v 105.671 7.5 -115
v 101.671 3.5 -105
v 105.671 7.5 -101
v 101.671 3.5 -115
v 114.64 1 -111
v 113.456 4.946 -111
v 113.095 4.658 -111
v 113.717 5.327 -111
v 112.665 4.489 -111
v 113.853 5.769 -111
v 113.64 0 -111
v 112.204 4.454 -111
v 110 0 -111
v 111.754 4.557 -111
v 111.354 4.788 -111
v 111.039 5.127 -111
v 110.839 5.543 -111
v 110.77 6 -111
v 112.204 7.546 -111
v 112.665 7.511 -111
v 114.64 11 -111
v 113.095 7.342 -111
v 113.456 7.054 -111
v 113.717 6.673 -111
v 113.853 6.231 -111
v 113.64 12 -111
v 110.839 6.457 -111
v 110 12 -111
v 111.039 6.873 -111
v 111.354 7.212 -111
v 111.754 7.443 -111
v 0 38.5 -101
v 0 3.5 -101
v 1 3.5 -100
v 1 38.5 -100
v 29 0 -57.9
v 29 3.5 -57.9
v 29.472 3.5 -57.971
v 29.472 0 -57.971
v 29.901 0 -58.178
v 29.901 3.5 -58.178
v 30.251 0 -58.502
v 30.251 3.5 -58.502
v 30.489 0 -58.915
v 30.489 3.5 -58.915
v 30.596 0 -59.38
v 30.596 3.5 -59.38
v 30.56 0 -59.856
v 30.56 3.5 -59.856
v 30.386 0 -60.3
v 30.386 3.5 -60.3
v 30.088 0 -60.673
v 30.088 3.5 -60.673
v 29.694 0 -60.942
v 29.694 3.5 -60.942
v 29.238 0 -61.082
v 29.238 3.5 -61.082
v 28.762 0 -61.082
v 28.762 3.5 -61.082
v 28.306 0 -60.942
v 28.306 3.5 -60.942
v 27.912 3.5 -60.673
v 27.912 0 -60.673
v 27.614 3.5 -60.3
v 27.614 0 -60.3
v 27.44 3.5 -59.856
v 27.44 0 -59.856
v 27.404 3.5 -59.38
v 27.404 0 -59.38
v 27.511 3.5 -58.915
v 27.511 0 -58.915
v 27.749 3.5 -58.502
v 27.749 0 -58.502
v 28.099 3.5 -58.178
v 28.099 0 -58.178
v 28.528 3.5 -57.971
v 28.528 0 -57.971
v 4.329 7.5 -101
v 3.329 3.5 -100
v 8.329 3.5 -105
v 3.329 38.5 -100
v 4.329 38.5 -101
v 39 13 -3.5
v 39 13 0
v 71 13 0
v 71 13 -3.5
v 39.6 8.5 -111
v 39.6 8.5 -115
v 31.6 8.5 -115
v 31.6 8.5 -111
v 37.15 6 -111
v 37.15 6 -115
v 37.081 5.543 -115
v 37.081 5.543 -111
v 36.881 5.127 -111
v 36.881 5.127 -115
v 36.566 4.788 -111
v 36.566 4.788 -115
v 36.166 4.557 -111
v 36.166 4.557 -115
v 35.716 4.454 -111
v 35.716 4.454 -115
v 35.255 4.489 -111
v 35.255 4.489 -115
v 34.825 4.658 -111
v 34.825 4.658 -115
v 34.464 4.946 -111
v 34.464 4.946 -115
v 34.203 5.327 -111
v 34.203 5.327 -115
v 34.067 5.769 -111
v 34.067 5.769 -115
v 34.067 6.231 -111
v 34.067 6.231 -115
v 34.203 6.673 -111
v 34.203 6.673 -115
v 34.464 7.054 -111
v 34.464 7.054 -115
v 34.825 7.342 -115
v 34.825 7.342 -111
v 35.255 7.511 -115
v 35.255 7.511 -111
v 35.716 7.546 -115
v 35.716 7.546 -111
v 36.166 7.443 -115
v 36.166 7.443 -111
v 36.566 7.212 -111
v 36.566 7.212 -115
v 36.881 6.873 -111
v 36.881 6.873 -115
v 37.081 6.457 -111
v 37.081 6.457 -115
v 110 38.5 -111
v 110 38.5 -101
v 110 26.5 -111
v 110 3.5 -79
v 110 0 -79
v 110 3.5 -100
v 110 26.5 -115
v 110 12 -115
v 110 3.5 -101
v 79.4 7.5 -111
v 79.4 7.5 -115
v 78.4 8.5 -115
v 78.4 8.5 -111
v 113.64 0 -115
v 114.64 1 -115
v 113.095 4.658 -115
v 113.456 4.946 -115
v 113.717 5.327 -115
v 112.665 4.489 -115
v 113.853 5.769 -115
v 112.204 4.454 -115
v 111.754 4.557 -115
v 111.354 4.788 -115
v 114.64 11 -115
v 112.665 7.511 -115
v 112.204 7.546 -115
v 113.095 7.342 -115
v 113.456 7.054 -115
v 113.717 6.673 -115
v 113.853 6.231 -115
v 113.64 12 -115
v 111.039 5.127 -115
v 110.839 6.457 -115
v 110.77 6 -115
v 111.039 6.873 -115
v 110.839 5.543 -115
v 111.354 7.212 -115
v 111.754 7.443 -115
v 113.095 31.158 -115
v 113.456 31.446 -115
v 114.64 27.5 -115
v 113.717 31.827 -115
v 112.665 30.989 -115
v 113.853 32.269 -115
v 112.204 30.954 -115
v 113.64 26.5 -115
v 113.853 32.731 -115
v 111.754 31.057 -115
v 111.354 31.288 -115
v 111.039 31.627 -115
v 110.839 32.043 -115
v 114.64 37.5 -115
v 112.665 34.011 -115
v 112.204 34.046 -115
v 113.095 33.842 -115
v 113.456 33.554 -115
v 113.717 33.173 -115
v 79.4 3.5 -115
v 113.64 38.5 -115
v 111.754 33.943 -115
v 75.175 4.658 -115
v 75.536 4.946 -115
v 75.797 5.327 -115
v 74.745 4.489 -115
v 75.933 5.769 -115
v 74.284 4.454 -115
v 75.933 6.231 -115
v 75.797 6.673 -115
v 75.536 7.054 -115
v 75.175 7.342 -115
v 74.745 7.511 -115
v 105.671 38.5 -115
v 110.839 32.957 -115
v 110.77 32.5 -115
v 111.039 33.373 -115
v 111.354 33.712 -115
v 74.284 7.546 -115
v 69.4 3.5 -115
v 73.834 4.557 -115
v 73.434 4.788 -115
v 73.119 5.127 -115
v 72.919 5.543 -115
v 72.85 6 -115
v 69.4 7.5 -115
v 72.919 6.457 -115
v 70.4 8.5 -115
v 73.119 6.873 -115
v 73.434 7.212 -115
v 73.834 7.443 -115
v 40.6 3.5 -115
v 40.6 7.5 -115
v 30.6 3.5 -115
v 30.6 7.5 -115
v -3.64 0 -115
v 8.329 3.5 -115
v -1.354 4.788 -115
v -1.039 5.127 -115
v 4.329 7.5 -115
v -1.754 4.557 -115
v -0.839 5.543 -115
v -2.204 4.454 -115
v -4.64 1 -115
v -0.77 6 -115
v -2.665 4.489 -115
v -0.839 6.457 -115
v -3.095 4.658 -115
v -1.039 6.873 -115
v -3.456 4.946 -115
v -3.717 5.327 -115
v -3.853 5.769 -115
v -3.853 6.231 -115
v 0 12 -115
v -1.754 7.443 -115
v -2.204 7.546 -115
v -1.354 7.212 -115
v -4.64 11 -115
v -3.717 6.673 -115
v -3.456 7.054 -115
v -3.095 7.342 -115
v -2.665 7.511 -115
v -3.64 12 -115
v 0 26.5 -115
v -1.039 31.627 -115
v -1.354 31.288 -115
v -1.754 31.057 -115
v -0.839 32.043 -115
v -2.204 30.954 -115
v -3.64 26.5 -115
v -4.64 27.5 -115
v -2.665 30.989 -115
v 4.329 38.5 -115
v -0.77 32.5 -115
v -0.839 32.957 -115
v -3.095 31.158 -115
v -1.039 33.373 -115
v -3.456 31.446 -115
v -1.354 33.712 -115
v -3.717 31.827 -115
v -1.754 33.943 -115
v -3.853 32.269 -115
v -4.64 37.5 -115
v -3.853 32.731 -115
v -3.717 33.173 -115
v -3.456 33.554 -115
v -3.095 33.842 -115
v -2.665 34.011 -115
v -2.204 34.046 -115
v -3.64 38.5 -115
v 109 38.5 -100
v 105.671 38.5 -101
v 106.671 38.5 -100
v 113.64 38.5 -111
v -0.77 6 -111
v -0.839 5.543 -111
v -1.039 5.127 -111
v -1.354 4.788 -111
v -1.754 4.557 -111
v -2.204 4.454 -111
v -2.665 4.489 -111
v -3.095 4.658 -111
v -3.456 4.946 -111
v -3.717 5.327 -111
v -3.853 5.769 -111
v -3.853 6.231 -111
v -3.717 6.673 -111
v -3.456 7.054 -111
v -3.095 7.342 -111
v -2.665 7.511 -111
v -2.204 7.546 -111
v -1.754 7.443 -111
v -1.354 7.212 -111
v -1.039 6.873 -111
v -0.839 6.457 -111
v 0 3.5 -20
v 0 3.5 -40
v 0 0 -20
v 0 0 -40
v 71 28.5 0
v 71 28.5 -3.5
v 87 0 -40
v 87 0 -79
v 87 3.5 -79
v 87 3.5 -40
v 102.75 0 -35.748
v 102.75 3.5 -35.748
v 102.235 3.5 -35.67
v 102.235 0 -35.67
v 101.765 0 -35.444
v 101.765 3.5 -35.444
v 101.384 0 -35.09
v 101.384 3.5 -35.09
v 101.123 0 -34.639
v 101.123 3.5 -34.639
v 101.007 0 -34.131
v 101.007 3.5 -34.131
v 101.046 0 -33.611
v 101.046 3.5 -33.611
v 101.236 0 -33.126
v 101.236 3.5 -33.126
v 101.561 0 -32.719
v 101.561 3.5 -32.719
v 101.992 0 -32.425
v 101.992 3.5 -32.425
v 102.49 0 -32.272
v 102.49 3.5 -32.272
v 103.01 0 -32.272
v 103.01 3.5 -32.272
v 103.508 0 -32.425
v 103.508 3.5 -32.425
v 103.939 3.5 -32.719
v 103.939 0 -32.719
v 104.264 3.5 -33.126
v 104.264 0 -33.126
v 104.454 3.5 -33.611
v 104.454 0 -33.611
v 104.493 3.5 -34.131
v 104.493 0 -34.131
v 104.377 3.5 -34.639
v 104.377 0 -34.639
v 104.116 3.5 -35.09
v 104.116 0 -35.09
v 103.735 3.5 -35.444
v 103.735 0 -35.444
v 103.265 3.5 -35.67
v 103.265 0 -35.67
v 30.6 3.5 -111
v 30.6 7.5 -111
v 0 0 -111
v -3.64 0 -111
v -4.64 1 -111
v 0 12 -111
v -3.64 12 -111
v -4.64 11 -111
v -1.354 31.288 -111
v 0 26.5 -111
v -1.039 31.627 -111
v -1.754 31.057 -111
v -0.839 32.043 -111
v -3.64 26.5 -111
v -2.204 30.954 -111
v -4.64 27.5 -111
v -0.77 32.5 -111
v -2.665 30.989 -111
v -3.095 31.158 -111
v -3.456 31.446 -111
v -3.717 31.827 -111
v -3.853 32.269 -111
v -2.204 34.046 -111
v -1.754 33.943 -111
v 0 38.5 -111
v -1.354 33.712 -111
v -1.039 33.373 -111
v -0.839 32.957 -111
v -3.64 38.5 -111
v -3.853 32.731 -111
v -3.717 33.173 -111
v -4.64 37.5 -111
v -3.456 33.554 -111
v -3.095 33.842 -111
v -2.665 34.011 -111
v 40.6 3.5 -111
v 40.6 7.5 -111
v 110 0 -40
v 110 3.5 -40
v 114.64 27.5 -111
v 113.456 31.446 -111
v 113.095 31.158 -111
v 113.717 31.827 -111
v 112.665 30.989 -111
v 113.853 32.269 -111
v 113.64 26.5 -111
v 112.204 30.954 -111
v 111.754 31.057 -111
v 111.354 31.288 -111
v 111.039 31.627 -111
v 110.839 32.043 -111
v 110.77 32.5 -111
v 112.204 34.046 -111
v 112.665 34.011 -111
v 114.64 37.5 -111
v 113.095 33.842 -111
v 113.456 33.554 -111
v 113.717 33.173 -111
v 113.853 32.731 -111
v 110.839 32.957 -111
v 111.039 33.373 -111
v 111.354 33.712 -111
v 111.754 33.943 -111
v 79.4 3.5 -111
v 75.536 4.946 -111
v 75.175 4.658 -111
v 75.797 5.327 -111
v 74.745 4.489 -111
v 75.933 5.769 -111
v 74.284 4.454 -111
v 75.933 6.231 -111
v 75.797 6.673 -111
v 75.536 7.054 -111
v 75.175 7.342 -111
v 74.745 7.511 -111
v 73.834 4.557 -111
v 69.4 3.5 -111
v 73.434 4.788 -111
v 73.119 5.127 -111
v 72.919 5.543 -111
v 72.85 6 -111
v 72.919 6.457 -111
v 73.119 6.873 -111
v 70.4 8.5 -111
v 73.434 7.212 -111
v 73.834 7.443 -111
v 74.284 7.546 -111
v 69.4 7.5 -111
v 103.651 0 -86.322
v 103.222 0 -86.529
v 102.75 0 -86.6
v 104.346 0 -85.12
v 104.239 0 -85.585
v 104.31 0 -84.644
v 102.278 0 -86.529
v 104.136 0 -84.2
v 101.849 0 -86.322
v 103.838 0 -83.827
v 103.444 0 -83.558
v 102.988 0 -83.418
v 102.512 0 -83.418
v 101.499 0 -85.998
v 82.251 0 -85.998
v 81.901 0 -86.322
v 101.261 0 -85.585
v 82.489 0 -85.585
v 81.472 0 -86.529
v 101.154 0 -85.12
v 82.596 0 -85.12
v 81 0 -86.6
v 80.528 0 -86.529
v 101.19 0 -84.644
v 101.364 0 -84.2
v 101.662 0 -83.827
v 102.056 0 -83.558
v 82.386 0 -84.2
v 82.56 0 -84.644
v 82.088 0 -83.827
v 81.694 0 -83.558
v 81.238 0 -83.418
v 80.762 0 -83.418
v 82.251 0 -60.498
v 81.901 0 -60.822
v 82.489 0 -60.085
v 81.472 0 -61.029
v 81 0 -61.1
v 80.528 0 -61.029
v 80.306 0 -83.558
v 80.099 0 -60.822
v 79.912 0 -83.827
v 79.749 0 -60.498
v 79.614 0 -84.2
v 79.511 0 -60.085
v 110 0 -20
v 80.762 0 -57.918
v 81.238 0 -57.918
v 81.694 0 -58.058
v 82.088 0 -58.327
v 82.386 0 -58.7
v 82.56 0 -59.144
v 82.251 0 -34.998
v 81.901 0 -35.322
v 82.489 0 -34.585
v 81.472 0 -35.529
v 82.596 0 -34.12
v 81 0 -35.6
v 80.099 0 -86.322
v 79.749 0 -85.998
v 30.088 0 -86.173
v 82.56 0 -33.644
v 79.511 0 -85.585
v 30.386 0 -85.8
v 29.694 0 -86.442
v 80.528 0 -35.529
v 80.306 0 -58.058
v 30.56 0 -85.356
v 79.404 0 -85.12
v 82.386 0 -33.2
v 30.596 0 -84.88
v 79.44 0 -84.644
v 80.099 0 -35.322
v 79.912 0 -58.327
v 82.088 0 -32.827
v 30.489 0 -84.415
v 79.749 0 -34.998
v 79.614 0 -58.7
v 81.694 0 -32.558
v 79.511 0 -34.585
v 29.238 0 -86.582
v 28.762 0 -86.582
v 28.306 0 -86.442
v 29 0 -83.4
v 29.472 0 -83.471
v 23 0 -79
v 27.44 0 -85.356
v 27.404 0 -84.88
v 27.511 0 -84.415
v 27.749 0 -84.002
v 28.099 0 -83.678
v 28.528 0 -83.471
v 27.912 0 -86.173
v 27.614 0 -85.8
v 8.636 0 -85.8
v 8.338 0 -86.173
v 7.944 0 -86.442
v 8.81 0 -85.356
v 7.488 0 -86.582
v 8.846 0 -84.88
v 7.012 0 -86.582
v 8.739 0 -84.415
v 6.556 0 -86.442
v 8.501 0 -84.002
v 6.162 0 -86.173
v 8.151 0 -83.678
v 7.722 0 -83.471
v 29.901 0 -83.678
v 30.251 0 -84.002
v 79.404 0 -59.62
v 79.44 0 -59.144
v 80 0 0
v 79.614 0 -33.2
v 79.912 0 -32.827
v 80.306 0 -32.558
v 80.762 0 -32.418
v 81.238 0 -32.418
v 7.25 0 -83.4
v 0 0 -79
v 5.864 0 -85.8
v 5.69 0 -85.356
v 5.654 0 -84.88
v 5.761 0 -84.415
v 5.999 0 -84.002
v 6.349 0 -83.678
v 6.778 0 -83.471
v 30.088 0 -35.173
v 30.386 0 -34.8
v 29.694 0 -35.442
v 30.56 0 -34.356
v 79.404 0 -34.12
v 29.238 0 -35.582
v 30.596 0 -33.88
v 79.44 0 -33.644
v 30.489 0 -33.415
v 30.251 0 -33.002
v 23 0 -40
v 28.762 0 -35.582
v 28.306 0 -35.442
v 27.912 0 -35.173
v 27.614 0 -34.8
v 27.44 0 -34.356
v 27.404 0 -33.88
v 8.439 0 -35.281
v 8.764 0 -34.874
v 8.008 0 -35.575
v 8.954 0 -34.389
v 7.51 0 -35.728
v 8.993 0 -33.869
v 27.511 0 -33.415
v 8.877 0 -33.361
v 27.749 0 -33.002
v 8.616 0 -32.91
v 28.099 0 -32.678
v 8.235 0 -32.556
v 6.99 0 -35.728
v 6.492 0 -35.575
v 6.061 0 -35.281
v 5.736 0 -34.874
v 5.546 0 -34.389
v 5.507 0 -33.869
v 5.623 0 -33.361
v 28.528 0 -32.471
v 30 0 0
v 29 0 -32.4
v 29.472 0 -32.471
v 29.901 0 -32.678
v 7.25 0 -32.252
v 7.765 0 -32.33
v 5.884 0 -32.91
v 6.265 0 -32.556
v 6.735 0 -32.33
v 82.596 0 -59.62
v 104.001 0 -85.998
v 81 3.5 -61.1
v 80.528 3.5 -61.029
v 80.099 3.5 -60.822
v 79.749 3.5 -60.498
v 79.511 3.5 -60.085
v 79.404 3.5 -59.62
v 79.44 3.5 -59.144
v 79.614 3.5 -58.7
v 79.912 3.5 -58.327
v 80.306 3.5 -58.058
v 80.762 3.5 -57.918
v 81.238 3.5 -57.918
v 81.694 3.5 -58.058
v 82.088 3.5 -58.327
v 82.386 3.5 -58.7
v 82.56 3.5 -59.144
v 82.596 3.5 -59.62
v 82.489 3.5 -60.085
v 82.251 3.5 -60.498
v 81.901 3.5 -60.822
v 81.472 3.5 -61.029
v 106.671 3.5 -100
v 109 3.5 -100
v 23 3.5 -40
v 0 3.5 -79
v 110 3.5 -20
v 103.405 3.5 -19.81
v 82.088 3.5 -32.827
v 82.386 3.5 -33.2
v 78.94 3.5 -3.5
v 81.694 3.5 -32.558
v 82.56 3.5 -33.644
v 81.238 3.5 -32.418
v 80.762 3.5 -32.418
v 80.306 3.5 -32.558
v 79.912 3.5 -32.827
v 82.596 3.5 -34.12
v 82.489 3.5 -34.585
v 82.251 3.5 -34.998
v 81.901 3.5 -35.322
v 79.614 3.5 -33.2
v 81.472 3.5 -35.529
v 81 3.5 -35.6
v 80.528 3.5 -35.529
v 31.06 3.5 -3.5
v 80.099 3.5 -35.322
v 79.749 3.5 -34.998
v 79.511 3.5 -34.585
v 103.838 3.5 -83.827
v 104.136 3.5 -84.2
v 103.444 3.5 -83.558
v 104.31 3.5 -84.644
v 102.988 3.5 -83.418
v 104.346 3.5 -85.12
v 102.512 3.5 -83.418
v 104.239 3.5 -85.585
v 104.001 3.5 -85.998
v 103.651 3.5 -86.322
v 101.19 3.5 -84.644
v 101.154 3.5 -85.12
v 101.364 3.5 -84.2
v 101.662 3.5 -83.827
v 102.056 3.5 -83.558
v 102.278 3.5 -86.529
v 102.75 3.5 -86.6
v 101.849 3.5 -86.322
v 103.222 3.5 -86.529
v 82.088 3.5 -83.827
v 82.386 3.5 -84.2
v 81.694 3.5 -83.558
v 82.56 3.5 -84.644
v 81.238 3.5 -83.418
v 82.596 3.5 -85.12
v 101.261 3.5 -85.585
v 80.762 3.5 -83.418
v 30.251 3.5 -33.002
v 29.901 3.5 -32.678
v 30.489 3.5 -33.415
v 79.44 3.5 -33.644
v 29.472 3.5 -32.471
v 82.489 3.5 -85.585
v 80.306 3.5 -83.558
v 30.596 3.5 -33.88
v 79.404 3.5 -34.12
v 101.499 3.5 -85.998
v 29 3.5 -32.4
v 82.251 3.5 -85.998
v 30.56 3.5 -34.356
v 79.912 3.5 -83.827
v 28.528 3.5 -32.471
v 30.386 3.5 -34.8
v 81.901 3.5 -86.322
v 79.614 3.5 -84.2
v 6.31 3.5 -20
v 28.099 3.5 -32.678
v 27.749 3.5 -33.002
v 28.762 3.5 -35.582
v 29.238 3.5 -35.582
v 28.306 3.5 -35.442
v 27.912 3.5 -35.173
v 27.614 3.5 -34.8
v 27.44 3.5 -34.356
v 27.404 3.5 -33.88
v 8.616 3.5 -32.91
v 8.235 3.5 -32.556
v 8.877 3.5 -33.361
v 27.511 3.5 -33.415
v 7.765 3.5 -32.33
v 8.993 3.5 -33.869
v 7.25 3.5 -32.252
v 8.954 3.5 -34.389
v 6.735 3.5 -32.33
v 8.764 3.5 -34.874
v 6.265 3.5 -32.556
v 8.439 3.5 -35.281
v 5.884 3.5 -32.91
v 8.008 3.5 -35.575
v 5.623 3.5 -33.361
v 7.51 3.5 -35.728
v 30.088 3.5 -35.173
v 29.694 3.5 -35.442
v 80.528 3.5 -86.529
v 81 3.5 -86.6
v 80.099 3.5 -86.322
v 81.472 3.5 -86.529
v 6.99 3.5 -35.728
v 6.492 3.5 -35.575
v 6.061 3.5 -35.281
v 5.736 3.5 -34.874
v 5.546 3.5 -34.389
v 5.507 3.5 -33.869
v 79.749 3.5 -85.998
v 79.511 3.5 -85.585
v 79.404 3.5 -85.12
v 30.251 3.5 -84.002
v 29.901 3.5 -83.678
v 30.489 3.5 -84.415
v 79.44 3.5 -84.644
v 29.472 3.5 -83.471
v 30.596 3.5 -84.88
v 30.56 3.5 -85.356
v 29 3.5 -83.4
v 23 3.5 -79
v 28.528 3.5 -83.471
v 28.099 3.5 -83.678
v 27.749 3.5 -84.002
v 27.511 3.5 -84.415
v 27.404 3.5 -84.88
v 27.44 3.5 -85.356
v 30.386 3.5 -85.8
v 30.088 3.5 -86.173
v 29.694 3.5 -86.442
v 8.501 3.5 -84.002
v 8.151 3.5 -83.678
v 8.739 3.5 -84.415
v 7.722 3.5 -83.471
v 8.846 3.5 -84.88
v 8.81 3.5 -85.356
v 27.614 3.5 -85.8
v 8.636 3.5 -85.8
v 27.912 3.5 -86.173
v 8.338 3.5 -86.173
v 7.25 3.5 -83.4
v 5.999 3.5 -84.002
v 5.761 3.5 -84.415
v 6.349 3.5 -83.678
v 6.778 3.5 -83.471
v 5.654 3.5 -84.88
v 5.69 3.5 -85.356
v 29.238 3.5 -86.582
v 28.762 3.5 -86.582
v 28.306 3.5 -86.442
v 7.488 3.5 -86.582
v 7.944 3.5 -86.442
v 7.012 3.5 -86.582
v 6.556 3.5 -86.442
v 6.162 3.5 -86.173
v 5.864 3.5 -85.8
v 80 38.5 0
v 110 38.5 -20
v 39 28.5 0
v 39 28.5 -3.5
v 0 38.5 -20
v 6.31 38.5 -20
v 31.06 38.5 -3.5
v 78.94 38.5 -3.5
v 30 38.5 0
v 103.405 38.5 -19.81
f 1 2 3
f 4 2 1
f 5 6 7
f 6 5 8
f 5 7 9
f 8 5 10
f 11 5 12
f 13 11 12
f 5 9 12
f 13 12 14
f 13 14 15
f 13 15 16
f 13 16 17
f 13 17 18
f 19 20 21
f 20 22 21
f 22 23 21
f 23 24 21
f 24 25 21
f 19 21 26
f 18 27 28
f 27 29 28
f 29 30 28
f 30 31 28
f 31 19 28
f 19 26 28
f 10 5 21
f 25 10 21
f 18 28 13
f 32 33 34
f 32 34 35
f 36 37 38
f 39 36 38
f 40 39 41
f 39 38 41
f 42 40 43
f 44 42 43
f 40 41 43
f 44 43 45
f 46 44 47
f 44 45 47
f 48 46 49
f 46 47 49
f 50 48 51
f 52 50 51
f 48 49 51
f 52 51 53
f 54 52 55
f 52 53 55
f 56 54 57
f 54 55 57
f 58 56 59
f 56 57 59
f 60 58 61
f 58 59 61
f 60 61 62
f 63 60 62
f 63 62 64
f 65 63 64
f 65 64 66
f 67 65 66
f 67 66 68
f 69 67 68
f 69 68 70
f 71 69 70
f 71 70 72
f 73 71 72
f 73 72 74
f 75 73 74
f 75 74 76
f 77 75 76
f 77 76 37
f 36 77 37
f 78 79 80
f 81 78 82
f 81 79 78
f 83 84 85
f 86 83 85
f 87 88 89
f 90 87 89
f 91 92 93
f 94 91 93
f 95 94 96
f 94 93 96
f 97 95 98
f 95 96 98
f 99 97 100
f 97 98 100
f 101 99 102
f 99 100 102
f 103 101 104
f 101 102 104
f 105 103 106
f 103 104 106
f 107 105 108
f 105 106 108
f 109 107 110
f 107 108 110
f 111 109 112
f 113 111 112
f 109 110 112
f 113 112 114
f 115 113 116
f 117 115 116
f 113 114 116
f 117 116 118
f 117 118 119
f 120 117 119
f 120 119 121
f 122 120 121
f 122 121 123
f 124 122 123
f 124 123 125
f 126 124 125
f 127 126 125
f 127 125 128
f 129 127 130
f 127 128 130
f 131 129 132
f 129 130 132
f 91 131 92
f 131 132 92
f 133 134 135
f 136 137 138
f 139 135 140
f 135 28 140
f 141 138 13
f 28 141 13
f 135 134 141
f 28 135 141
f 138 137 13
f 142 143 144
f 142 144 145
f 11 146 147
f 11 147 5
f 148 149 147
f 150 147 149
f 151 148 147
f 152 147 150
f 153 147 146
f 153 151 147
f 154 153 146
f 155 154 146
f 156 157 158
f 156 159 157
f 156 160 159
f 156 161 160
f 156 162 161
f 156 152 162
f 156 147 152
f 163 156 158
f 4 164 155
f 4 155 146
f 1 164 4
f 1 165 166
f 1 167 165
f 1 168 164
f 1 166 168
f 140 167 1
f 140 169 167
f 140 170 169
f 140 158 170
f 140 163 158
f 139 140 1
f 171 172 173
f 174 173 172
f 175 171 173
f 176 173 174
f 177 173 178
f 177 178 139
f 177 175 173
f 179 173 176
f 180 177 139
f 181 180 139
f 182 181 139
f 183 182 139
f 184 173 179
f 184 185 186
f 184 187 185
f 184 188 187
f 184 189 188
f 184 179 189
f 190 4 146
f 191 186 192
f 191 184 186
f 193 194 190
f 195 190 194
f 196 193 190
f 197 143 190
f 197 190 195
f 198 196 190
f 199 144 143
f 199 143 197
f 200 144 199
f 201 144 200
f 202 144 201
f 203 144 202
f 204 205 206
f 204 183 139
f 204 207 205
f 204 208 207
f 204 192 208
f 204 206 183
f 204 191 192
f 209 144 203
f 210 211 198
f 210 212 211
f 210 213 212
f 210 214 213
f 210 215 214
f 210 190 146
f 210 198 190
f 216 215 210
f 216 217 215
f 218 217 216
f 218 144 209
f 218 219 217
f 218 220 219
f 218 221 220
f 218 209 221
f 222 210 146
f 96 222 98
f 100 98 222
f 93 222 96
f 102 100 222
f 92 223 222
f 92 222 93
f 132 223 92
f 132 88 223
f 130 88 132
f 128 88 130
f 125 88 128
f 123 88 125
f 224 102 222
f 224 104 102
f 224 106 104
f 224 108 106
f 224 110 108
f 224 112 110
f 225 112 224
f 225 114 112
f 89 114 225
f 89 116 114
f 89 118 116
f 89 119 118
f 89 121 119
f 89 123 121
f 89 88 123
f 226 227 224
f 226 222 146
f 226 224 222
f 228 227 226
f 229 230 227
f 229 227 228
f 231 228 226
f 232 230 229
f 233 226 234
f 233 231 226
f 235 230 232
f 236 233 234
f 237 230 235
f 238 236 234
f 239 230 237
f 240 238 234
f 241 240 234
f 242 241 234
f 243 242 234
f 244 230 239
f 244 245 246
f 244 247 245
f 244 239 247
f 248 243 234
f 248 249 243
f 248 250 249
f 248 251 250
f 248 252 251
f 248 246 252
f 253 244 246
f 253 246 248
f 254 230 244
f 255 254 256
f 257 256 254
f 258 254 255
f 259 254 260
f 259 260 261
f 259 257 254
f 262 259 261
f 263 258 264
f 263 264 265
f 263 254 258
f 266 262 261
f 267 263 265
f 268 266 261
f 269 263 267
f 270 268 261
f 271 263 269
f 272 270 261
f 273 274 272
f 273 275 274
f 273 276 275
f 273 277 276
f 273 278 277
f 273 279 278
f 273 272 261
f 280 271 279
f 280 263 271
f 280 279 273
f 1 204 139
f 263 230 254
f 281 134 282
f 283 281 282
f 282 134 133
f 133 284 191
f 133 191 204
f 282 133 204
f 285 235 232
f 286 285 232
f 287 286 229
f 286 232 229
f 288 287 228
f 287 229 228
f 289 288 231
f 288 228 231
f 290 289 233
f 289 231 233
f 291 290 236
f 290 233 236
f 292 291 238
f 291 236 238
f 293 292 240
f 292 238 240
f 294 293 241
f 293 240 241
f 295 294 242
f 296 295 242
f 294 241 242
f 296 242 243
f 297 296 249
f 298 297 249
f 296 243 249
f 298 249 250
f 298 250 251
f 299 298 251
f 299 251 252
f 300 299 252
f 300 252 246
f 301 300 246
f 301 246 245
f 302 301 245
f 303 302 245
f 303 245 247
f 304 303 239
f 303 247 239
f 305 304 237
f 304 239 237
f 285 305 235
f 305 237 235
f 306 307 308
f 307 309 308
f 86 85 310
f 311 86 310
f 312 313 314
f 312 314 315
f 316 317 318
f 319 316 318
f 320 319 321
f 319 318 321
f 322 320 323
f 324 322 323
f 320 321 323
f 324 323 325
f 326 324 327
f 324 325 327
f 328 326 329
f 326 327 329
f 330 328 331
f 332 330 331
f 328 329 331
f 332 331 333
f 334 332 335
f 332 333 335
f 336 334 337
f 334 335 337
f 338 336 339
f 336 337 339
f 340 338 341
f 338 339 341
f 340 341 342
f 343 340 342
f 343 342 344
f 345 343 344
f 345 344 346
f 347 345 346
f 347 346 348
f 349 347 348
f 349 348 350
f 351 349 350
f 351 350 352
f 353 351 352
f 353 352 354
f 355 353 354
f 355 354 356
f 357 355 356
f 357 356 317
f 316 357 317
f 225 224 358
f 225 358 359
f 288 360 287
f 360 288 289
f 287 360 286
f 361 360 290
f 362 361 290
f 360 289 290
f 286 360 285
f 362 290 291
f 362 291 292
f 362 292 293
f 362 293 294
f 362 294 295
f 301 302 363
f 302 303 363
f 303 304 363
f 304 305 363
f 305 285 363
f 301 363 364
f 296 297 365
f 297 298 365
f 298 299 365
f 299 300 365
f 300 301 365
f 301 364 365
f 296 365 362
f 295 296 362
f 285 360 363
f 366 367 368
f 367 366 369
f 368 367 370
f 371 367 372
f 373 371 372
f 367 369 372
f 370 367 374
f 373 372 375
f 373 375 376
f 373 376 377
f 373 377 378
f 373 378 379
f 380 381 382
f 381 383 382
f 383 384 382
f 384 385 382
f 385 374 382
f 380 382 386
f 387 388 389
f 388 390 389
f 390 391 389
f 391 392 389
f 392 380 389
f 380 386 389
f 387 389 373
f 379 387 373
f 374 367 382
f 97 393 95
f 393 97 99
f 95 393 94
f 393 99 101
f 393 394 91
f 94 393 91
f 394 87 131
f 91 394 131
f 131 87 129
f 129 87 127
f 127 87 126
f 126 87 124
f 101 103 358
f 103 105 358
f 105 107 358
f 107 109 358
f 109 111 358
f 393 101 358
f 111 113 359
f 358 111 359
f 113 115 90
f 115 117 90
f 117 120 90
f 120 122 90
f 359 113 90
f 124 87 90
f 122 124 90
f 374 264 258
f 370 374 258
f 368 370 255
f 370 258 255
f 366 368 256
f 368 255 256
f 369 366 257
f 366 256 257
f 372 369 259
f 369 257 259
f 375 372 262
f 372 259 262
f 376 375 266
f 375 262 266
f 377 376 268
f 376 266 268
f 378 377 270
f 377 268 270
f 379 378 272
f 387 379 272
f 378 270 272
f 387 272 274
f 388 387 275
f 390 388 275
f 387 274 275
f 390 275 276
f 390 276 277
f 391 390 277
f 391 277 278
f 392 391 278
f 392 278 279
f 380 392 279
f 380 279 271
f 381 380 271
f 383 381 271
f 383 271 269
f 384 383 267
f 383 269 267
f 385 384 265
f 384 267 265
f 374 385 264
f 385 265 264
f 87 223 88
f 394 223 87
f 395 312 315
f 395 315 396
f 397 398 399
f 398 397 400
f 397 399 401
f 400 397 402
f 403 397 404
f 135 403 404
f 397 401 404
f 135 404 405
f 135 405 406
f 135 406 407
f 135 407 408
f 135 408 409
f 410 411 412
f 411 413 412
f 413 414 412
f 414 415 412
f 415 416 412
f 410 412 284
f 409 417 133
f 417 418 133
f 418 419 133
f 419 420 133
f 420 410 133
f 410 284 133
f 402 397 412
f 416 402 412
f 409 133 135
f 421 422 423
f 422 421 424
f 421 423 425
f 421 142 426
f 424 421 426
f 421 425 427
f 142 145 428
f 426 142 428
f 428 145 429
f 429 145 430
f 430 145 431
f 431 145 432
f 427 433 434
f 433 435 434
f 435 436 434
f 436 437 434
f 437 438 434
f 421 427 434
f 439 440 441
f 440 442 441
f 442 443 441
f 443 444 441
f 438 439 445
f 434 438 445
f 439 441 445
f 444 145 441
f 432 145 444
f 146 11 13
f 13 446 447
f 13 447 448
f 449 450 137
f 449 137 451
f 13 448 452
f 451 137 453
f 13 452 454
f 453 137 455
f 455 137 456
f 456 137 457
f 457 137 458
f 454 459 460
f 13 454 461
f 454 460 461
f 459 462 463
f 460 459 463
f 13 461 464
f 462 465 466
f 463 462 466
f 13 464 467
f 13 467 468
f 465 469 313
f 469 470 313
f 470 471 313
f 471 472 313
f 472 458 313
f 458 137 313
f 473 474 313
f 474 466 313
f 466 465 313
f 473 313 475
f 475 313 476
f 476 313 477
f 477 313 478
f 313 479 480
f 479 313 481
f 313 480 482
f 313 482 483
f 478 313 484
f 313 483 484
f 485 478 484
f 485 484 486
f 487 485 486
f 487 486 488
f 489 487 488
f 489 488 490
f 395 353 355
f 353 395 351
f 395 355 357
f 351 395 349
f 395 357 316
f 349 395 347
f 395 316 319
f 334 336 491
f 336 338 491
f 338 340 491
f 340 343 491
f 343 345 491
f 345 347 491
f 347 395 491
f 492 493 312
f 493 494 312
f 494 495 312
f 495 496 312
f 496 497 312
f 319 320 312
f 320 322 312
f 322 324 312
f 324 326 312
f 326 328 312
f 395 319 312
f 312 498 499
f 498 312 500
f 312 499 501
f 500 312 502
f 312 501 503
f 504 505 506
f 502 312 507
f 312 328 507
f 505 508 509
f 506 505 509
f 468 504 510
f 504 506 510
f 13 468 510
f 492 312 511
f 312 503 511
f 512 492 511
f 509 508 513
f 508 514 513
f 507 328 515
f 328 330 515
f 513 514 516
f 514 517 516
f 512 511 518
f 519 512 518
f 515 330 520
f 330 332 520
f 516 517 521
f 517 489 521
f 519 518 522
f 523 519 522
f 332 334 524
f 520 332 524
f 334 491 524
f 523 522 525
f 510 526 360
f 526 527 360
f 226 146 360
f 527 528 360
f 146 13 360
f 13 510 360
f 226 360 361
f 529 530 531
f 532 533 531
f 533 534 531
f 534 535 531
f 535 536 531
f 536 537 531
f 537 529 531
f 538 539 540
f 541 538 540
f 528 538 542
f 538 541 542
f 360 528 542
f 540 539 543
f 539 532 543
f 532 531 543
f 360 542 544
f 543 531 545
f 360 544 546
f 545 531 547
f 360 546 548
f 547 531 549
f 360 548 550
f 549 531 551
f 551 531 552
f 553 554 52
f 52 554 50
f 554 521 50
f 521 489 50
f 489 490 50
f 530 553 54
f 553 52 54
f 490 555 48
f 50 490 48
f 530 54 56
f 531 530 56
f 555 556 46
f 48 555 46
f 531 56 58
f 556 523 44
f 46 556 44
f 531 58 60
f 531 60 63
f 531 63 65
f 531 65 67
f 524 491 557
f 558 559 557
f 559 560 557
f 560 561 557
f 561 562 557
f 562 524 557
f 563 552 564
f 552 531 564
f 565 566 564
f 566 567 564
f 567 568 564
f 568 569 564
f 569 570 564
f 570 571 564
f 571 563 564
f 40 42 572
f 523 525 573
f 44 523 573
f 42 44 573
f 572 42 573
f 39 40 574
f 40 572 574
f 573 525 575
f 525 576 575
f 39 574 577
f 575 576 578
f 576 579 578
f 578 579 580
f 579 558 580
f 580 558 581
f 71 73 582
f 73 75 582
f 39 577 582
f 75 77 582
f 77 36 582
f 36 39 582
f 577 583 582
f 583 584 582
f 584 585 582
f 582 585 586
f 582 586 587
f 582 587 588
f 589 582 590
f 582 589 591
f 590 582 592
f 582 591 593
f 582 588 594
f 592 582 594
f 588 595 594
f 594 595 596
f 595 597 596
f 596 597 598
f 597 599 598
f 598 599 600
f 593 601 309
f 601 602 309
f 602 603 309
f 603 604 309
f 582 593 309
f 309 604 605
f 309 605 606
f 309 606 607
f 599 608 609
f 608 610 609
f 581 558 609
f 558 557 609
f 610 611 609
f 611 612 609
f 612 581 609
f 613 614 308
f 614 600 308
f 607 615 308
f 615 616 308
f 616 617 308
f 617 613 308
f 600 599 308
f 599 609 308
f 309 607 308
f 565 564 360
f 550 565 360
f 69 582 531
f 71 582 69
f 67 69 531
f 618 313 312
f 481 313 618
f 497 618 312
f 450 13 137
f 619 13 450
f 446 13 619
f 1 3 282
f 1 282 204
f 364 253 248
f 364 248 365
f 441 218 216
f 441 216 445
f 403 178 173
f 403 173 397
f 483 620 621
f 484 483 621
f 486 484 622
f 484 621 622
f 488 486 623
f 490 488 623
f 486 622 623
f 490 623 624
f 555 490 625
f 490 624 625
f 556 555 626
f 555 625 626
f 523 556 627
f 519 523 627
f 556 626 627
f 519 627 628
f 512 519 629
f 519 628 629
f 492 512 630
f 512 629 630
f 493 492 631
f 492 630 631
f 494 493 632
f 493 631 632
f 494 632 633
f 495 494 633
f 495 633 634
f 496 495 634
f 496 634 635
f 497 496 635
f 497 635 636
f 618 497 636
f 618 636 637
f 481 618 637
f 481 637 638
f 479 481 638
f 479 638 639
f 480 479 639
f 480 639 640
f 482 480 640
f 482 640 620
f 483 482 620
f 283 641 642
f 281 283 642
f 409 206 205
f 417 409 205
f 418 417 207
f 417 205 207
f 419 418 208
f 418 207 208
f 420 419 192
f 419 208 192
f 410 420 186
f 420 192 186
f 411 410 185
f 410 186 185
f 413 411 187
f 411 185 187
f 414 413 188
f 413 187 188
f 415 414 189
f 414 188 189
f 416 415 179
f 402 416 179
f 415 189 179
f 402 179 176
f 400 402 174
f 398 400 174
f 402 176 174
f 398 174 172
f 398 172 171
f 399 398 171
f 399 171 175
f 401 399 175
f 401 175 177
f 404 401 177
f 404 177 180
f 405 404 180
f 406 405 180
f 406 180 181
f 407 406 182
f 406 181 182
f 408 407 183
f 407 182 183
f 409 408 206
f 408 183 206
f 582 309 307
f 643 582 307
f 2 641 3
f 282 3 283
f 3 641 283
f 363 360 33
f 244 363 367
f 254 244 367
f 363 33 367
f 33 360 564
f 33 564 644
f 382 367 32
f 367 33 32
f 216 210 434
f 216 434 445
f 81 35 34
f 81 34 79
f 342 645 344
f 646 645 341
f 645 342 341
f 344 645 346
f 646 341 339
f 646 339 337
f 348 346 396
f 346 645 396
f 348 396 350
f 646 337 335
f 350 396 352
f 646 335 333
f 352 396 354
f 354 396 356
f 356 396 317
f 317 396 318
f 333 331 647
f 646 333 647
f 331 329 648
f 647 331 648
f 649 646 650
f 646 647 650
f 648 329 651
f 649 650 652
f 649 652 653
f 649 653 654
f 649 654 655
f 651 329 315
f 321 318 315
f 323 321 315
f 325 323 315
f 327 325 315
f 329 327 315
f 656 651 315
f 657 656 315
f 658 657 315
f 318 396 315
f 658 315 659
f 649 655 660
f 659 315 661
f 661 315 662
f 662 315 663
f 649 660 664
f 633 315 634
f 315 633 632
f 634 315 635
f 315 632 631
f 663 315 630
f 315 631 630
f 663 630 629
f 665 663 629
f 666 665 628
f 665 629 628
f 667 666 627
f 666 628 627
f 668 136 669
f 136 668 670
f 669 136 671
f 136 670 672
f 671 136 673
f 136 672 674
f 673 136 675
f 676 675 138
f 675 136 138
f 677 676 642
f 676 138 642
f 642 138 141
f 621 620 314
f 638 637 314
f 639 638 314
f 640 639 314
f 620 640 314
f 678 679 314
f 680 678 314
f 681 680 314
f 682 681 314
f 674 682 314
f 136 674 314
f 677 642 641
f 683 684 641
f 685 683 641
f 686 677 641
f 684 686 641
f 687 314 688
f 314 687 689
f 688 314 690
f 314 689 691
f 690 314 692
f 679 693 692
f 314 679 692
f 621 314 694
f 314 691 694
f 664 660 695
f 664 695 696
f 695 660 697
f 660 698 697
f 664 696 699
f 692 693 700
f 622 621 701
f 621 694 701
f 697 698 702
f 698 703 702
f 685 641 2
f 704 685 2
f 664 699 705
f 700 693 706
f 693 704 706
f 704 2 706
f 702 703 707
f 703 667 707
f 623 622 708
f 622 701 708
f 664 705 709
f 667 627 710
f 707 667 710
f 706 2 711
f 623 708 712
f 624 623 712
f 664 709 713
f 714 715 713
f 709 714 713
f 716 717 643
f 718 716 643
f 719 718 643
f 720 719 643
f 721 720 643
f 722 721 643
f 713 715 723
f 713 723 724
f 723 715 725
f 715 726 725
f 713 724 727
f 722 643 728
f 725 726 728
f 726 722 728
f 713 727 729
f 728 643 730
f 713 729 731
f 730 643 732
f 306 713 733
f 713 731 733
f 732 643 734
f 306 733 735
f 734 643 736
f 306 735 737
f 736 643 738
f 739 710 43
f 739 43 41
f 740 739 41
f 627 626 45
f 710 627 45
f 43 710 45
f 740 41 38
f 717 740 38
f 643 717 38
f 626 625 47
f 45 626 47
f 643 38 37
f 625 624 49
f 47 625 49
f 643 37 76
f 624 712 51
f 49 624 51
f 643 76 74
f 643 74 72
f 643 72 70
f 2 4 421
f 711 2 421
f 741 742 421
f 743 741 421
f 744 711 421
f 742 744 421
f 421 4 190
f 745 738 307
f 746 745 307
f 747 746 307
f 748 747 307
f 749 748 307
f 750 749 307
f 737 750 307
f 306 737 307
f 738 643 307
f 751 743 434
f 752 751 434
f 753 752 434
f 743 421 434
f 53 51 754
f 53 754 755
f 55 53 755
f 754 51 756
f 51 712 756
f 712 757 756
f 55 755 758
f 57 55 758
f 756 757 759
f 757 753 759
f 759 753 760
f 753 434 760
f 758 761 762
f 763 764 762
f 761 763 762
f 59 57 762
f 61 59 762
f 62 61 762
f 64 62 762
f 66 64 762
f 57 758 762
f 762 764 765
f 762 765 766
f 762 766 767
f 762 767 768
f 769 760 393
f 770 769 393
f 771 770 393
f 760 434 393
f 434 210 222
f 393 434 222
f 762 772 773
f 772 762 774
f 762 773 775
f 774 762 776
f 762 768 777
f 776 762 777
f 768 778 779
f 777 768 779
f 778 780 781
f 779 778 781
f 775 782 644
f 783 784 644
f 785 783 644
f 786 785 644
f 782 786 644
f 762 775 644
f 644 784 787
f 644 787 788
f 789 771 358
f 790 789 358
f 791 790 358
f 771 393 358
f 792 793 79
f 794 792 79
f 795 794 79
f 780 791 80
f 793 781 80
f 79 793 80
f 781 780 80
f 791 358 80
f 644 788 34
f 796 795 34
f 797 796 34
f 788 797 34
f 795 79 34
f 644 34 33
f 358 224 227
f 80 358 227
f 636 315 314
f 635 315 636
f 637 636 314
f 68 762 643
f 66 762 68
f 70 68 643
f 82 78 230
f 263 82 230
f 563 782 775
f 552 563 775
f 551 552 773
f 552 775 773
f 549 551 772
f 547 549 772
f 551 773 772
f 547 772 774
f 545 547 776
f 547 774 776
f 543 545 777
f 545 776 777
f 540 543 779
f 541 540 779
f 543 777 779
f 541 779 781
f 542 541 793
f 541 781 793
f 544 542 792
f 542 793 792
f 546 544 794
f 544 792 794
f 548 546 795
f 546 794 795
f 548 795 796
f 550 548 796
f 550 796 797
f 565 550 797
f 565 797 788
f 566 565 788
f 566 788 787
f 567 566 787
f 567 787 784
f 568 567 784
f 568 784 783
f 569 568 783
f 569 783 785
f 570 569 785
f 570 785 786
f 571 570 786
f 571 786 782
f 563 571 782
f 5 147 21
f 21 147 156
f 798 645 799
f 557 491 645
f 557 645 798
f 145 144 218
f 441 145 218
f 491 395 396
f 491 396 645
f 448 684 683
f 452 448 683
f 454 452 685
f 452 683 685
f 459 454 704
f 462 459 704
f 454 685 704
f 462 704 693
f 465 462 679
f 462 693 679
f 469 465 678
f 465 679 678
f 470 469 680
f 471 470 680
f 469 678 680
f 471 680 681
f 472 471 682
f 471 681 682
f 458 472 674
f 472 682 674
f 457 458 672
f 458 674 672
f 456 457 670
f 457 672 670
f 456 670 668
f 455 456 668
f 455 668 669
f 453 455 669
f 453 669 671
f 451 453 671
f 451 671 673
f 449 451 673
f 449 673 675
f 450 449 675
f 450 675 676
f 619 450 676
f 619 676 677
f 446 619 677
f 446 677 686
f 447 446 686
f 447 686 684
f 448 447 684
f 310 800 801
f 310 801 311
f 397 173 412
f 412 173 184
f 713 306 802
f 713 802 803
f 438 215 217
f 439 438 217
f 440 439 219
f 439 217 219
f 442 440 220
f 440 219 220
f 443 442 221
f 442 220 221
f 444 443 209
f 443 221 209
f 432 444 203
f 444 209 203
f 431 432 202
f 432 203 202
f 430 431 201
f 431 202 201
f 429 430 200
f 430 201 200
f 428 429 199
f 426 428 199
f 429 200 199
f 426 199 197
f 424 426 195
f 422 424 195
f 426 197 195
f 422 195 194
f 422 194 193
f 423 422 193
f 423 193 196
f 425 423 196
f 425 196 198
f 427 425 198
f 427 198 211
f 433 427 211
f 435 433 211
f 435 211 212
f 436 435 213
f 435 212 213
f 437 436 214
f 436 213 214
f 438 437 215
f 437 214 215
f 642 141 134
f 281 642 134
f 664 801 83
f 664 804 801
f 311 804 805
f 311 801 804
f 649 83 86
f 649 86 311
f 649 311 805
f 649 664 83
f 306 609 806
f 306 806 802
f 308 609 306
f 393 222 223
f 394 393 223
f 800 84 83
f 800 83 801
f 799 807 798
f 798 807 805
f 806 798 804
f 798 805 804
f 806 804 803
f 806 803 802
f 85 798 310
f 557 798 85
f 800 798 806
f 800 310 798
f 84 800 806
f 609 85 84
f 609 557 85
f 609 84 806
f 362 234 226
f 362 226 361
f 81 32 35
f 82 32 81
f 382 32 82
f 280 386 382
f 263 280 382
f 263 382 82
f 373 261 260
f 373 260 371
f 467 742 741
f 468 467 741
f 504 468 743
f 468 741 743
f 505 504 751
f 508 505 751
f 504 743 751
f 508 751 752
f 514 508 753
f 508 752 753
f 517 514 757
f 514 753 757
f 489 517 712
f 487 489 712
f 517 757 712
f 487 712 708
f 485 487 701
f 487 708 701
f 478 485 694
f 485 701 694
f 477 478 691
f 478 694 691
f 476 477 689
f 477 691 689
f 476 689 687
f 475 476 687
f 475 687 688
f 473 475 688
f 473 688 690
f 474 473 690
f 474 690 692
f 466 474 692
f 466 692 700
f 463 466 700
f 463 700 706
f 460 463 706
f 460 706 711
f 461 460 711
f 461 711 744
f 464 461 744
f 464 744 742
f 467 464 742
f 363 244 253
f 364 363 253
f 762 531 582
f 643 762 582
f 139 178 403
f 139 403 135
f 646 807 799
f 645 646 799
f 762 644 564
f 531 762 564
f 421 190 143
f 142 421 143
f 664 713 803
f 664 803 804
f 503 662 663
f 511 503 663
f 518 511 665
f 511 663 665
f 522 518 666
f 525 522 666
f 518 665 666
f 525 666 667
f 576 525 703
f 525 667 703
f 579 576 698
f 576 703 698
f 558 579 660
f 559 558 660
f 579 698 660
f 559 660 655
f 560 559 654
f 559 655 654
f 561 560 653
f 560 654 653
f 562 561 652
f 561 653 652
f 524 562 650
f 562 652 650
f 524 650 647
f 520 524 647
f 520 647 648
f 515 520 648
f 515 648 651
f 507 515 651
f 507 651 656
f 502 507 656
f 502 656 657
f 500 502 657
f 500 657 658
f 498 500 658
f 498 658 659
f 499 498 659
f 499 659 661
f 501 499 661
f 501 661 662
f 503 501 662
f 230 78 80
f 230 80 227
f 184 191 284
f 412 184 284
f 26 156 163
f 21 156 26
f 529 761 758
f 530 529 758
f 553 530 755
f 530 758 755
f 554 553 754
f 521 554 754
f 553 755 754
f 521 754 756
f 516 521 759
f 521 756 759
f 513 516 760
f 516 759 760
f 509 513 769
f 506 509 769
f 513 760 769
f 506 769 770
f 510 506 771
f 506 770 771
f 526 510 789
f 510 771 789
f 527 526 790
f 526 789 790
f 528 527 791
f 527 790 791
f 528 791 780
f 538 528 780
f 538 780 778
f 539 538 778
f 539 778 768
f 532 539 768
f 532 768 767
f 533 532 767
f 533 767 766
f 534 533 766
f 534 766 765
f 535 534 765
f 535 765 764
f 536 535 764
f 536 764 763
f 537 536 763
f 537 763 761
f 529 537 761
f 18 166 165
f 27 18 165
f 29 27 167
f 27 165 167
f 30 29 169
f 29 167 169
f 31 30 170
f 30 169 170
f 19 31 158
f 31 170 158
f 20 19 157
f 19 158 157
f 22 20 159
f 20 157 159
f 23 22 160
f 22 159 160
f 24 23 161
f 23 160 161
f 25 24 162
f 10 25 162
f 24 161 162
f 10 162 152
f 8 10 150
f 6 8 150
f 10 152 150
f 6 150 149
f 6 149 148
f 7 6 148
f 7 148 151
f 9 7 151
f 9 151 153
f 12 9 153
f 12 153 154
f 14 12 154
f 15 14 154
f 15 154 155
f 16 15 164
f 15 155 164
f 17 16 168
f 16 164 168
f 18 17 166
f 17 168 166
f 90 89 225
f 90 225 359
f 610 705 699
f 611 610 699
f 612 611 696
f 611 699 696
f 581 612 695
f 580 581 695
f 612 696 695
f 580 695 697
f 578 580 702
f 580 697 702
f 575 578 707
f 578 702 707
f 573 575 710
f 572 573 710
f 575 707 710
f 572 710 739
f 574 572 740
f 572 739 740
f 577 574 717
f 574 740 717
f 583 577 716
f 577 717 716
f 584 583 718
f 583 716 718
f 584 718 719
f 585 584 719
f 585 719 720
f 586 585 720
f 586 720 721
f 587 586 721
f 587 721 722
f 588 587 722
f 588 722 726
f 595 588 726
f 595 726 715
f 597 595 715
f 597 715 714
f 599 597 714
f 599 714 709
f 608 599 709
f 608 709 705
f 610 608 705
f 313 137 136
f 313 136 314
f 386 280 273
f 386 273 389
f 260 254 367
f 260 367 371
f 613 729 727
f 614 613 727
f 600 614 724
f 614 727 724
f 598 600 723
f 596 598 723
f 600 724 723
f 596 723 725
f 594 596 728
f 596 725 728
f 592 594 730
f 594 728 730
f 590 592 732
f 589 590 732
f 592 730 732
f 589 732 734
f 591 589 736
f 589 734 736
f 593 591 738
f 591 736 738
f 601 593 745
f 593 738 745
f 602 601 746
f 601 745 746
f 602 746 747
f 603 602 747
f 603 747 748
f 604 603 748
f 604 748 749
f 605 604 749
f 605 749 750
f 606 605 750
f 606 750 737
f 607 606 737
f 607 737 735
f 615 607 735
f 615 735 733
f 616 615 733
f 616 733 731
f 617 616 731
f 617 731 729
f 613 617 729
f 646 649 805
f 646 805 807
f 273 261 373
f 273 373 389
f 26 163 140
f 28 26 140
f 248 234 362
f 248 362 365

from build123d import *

# Parameters (mm, degrees)
BOSS_EXTRUDE1_DEPTH  = 3.5
BOSS_EXTRUDE2_DEPTH  = 21
SKETCH3_W            = 23
SKETCH3_H            = 39
BOSS_EXTRUDE3_DEPTH  = 2.5
SKETCH5_W            = 21.5
SKETCH5_H            = 25
SKETCH5_W_2          = 7.07
SKETCH5_H_2          = 19.04
BOSS_EXTRUDE5_DEPTH  = 2.5
SKETCH6_W            = 7.07
SKETCH6_H            = 5.9
BOSS_EXTRUDE6_DEPTH  = 20
BOSS_EXTRUDE7_DEPTH  = 23
FILLET1_SIZE         = 10
SKETCH9_R            = 2.475
BOSS_EXTRUDE8_DEPTH  = 9
FILLET2_R            = 0.5
SKETCH10_R           = 1.65
CUT_EXTRUDE1_DEPTH   = 9
SKETCH11_W           = 0.2
SKETCH11_H           = 20
CUT_EXTRUDE2_DEPTH   = 9
CUT_EXTRUDE3_DEPTH   = 9
FILLET3_SIZE         = 3
BOSS_EXTRUDE9_DEPTH  = 5
SKETCH14_R           = 1.747814763
SKETCH14_R_2         = 1.6
CUT_EXTRUDE4_DEPTH   = 15
BOSS_EXTRUDE10_DEPTH = 35
SKETCH17_W           = 110
SKETCH17_H           = 3.5
BOSS_EXTRUDE11_DEPTH = 15
SKETCH18_W           = 161.485932181
SKETCH18_H           = 44
CUT_EXTRUDE5_DEPTH   = 63
SKETCH19_W           = 4.328620931
SKETCH19_H           = 15
BOSS_EXTRUDE12_DEPTH = 35
FILLET4_SIZE         = 1
SKETCH20_W           = 4.640065176
SKETCH20_H           = 12
SKETCH20_R           = 1.55
SKETCH20_W_2         = 10
SKETCH20_H_2         = 5
BOSS_EXTRUDE13_DEPTH = 4
SKETCH21_W           = 32
SKETCH21_H           = 15.5
CUT_EXTRUDE6_DEPTH   = 14
FILLET5_SIZE         = 1
FILLET6_SIZE         = 4


with BuildPart() as part:
    # Sketch1 → Boss-Extrude1 (new body)
    with BuildSketch(Plane(origin=(0, 0, 0), x_dir=(1, 0, 0), z_dir=(0, 1, 0))):
        Polygon((0, 40), (23, 40), (23, 79), (0, 79), (0, 100), (110, 100), (110, 79), (87, 79), (87, 40), (110, 40), (110, 20), (80, 0), (30, 0), (0, 20), align=None)
    extrude(amount=BOSS_EXTRUDE1_DEPTH)

    # Sketch2 → Boss-Extrude2 (add)
    with BuildSketch(Plane(origin=(0, 3.5, 0), x_dir=(1, 0, 0), z_dir=(0, 1, 0))):
        Polygon((0, 79), (23, 79), (23, 40), (0, 40), (0, 37.5), (25.5, 37.5), (25.5, 81.5), (0, 81.5), align=None)
        Polygon((110, 81.5), (84.5, 81.5), (84.5, 37.5), (110, 37.5), (110, 40), (87, 40), (87, 79), (110, 79), align=None)
    extrude(amount=BOSS_EXTRUDE2_DEPTH)

    # Sketch3 → Boss-Extrude3 (add)
    with BuildSketch(Plane(origin=(0, 24.5, 0), x_dir=(1, 0, 0), z_dir=(0, 1, 0))):
        with Locations((11.5, 59.5)):
            Rectangle(SKETCH3_W, SKETCH3_H)
        with Locations((98.5, 59.5)):
            Rectangle(SKETCH3_W, SKETCH3_H)
    extrude(amount=-BOSS_EXTRUDE3_DEPTH)

    # Sketch5 → Boss-Extrude5 (add)
    with BuildSketch(Plane(origin=(0, 24.5, 0), x_dir=(1, 0, 0), z_dir=(0, 1, 0))):
        with Locations((120.75, 50)):
            Rectangle(SKETCH5_W, SKETCH5_H)
        with Locations((-10.75, 50)):
            Rectangle(SKETCH5_W, SKETCH5_H)
        with Locations((29.035, 47.02)):
            Rectangle(SKETCH5_W_2, SKETCH5_H_2)
        with Locations((80.965, 47.02)):
            Rectangle(SKETCH5_W_2, SKETCH5_H_2)
    extrude(amount=-BOSS_EXTRUDE5_DEPTH)

    # Sketch6 → Boss-Extrude6 (add)
    with BuildSketch(Plane(origin=(0, 24.5, 0), x_dir=(1, 0, 0), z_dir=(0, 1, 0))):
        with Locations((29.035, 53.59)):
            Rectangle(SKETCH6_W, SKETCH6_H)
        with Locations((80.965, 53.59)):
            Rectangle(SKETCH6_W, SKETCH6_H)
        with Locations((-17.965, 53.59)):
            Rectangle(SKETCH6_W, SKETCH6_H)
        with Locations((127.965, 53.59)):
            Rectangle(SKETCH6_W, SKETCH6_H)
    extrude(amount=BOSS_EXTRUDE6_DEPTH)

    # Sketch7 → Boss-Extrude7 (add)
    with BuildSketch(Plane(origin=(0, 24.5, 0), x_dir=(1, 0, 0), z_dir=(0, 1, 0))):
        Polygon((0, 81.5), (25.5, 81.5), (25.5, 79), (0, 79), (-21.5, 79), (-21.5, 81.5), align=None)
        Polygon((110, 79), (84.5, 79), (84.5, 81.5), (110, 81.5), (131.5, 81.5), (131.5, 79), align=None)
    extrude(amount=BOSS_EXTRUDE7_DEPTH)

    # Fillet1
    # the kernel refuses this chamfer: 10 mm, written as the material it adds along each edge
    with BuildSketch(Plane(origin=(0, 22, -40), x_dir=(0.027495876610586372, -0.9996219169112968, 0), z_dir=(0, 0, 1)), Plane(origin=(110, 22, -37.5), x_dir=(-0.027495876610586317, -0.9996219169112968, 0), z_dir=(0, 0, -1)), Plane(origin=(110, 24.5, -81.5), x_dir=(0.9996219169112968, 0.027495876610586317, 0), z_dir=(0, 0, 1))) as fillet1_piece_1:
        Polygon((FILLET1_SIZE * 0.999621916911, -FILLET1_SIZE * 0.0274958766106), (-FILLET1_SIZE * 0.0274958766106, -FILLET1_SIZE * 0.999621916911), (0, 0), align=None)
    extrude(amount=2.5)
    with BuildSketch(Plane(origin=(0, 24.5, -79), x_dir=(0.027495876610586372, -0.9996219169112968, 0), z_dir=(0, 0, -1))) as fillet1_piece_2:
        Polygon((FILLET1_SIZE * 0.999621916911, FILLET1_SIZE * 0.0274958766106), (-FILLET1_SIZE * 0.0274958766106, FILLET1_SIZE * 0.999621916911), (0, 0), align=None)
    extrude(amount=2.5)

    # Sketch9 → Boss-Extrude8 (add)
    with BuildSketch(Plane(origin=(0, 0, -81.5), x_dir=(-1, 0, 0), z_dir=(0, 0, -1))):
        with Locations(Location((-114.55, 34.35, 0), (0, 0, 180))):
            Circle(SKETCH9_R)
        with Locations(Location((4.55, 34.35, 0), (0, 0, 180))):
            Circle(SKETCH9_R)
    extrude(amount=BOSS_EXTRUDE8_DEPTH)

    # Fillet2
    fillet2_edges = [part.edges().sort_by_distance(p)[0] for p in [
        (112.075, 34.35, -90.5),
        (-7.025, 34.35, -90.5),
    ]]
    fillet(fillet2_edges, radius=FILLET2_R)

    # Sketch10 → Cut-Extrude1 (cut)
    with BuildSketch(Plane.XY.offset(-50.64)):
        with Locations((129.16, 39.27)):
            Circle(SKETCH10_R)
        with Locations((129.16, 29.43)):
            Circle(SKETCH10_R)
        with Locations((79.77, 39.27)):
            Circle(SKETCH10_R)
        with Locations((79.77, 29.43)):
            Circle(SKETCH10_R)
        with Locations((-19.16, 29.43)):
            Circle(SKETCH10_R)
        with Locations((-19.16, 39.27)):
            Circle(SKETCH10_R)
        with Locations(Location((30.23, 39.27, 0), (0, 0, 180))):
            Circle(SKETCH10_R)
        with Locations(Location((30.23, 29.43, 0), (0, 0, 180))):
            Circle(SKETCH10_R)
    extrude(amount=-CUT_EXTRUDE1_DEPTH, mode=Mode.SUBTRACT)

    # Sketch11 → Cut-Extrude2 (cut)
    with BuildSketch(Plane.XY.offset(-50.64)):
        with Locations((-14.53, 34.5)):
            Rectangle(SKETCH11_W, SKETCH11_H)
        with Locations((25.6, 34.5)):
            Rectangle(SKETCH11_W, SKETCH11_H)
        with Locations((84.4, 34.5)):
            Rectangle(SKETCH11_W, SKETCH11_H)
        with Locations((124.53, 34.5)):
            Rectangle(SKETCH11_W, SKETCH11_H)
    extrude(amount=-CUT_EXTRUDE2_DEPTH, mode=Mode.SUBTRACT)

    # Sketch12 → Cut-Extrude3 (cut)
    with BuildSketch(Plane(origin=(0, 0, -81.5), x_dir=(-1, 0, 0), z_dir=(0, 0, -1))):
        Polygon((-108, 47.5), (-84.5, 25.5), (-84.5, 47.5), align=None)
        Polygon((-25.5, 25.5), (-25.5, 47.5), (-2, 47.5), align=None)
        Polygon((-120, 24.5), (-131.5, 36), (-131.5, 24.5), align=None)
        Polygon((10, 24.5), (21.5, 36), (21.5, 24.5), align=None)
    extrude(amount=-CUT_EXTRUDE3_DEPTH, mode=Mode.SUBTRACT)

    # Fillet3
    fillet3_edges = [part.edges().sort_by_distance(p)[0] for p in [
        (0, 23.25, -62.5),
        (110, 23.25, -62.5),
    ]]
    chamfer(fillet3_edges, length=FILLET3_SIZE)

    # Sketch13 → Boss-Extrude9 (add)
    with BuildSketch(Plane(origin=(0, 3.5, 0), x_dir=(1, 0, 0), z_dir=(0, 1, 0))):
        Polygon((0, 30.5), (32.5, 30.5), (32.5, 88.5), (0, 88.5), (0, 81.5), (25.5, 81.5), (25.5, 37.5), (0, 37.5), align=None)
        Polygon((84.5, 37.5), (110, 37.5), (110, 30.5), (77.5, 30.5), (77.5, 88.5), (110, 88.5), (110, 81.5), (84.5, 81.5), align=None)
    extrude(amount=BOSS_EXTRUDE9_DEPTH)

    # Sketch14 → Cut-Extrude4 (cut)
    with BuildSketch(Plane(origin=(0, 8.5, 0), x_dir=(1, 0, 0), z_dir=(0, 1, 0))):
        with Locations(Location((7.25, 34, 0), (0, 0, 270))):
            Circle(SKETCH14_R)
        with Locations(Location((7.25, 85, 0), (0, 0, 270))):
            Circle(SKETCH14_R_2)
        with Locations(Location((29, 34, 0), (0, 0, 270))):
            Circle(SKETCH14_R_2)
        with Locations(Location((29, 59.5, 0), (0, 0, 270))):
            Circle(SKETCH14_R_2)
        with Locations(Location((29, 85, 0), (0, 0, 270))):
            Circle(SKETCH14_R_2)
        with Locations(Location((81, 34, 0), (0, 0, 90))):
            Circle(SKETCH14_R_2)
        with Locations(Location((102.75, 34, 0), (0, 0, 90))):
            Circle(SKETCH14_R)
        with Locations(Location((81, 59.5, 0), (0, 0, 90))):
            Circle(SKETCH14_R_2)
        with Locations(Location((81, 85, 0), (0, 0, 90))):
            Circle(SKETCH14_R_2)
        with Locations(Location((102.75, 85, 0), (0, 0, 90))):
            Circle(SKETCH14_R_2)
    extrude(amount=-CUT_EXTRUDE4_DEPTH, mode=Mode.SUBTRACT)

    # Sketch15 → Boss-Extrude10 (add)
    with BuildSketch(Plane(origin=(0, 3.5, 0), x_dir=(1, 0, 0), z_dir=(0, 1, 0))):
        Polygon((110, 20), (80, 0), (30, 0), (0, 20), (6.309714732, 20), (31.059714732, 3.5), (78.940285268, 3.5), (103.405491726, 19.81009599), align=None)
    extrude(amount=BOSS_EXTRUDE10_DEPTH)

    # Sketch17 → Boss-Extrude11 (add)
    with BuildSketch(Plane(origin=(0, 0, -100), x_dir=(-1, 0, 0), z_dir=(0, 0, -1))):
        with Locations((-55, 1.75)):
            Rectangle(SKETCH17_W, SKETCH17_H)
    extrude(amount=BOSS_EXTRUDE11_DEPTH)

    # Sketch18 → Cut-Extrude5 (cut)
    with BuildSketch(Plane(origin=(0, 0, -88.5), x_dir=(-1, 0, 0), z_dir=(0, 0, -1))):
        with Locations((-59.242966091, 25.5)):
            Rectangle(SKETCH18_W, SKETCH18_H)
    extrude(amount=-CUT_EXTRUDE5_DEPTH, mode=Mode.SUBTRACT)


with BuildPart() as body_2:
    # of the pieces the cut leaves, the one that is kept (cut_extrude5_keep)
    add(part.part.solids().sort_by_distance((0, 3.5, -79))[0])

    # Sketch19 → Boss-Extrude12 (add)
    with BuildSketch(Plane(origin=(0, 3.5, 0), x_dir=(1, 0, 0), z_dir=(0, 1, 0))):
        with Locations((107.835689535, 107.5)):
            Rectangle(SKETCH19_W, SKETCH19_H)
        with Locations((2.164310466, 107.5)):
            Rectangle(SKETCH19_W, SKETCH19_H)
    extrude(amount=BOSS_EXTRUDE12_DEPTH)

    # Fillet4
    fillet4_edges = [body_2.edges().sort_by_distance(p)[0] for p in [
        (0, 21, -100),
        (4.328620931, 21, -100),
        (110, 21, -100),
        (105.671379069, 21, -100),
    ]]
    chamfer(fillet4_edges, length=FILLET4_SIZE)

    # Sketch20 → Boss-Extrude13 (add)
    # profile 1 of 6: a face of its own
    with BuildSketch(Plane(origin=(0, 0, -115), x_dir=(-1, 0, 0), z_dir=(0, 0, -1))):
        with Locations((-112.320032588, 32.5)):
            Rectangle(SKETCH20_W, SKETCH20_H)
        with Locations((-112.320032588, 32.5)):
            Circle(SKETCH20_R, mode=Mode.SUBTRACT)
    # profile 2 of 6: a face of its own
    with BuildSketch(Plane(origin=(0, 0, -115), x_dir=(-1, 0, 0), z_dir=(0, 0, -1))):
        with Locations((-112.320032588, 6)):
            Rectangle(SKETCH20_W, SKETCH20_H)
        with Locations((-112.320032588, 6)):
            Circle(SKETCH20_R, mode=Mode.SUBTRACT)
    # profile 3 of 6: a face of its own
    with BuildSketch(Plane(origin=(0, 0, -115), x_dir=(-1, 0, 0), z_dir=(0, 0, -1))):
        with Locations((2.320032588, 6)):
            Rectangle(SKETCH20_W, SKETCH20_H)
        with Locations(Location((2.320032588, 6, 0), (0, 0, 180))):
            Circle(SKETCH20_R, mode=Mode.SUBTRACT)
    # profile 4 of 6: a face of its own
    with BuildSketch(Plane(origin=(0, 0, -115), x_dir=(-1, 0, 0), z_dir=(0, 0, -1))):
        with Locations((2.320032588, 32.5)):
            Rectangle(SKETCH20_W, SKETCH20_H)
        with Locations(Location((2.320032588, 32.5, 0), (0, 0, 180))):
            Circle(SKETCH20_R, mode=Mode.SUBTRACT)
    # profile 5 of 6: a face of its own
    with BuildSketch(Plane(origin=(0, 0, -115), x_dir=(-1, 0, 0), z_dir=(0, 0, -1))):
        with Locations((-74.4, 6)):
            Rectangle(SKETCH20_W_2, SKETCH20_H_2)
        with Locations((-74.4, 6)):
            Circle(SKETCH20_R, mode=Mode.SUBTRACT)
    # profile 6 of 6: a face of its own
    with BuildSketch(Plane(origin=(0, 0, -115), x_dir=(-1, 0, 0), z_dir=(0, 0, -1))):
        with Locations((-35.6, 6)):
            Rectangle(SKETCH20_W_2, SKETCH20_H_2)
        with Locations(Location((-35.6, 6, 0), (0, 0, 180))):
            Circle(SKETCH20_R, mode=Mode.SUBTRACT)
    extrude(amount=-BOSS_EXTRUDE13_DEPTH)

    # Sketch21 → Cut-Extrude6 (cut)
    with BuildSketch(Plane.XY):
        with Locations((55, 20.75)):
            Rectangle(SKETCH21_W, SKETCH21_H)
    extrude(amount=-CUT_EXTRUDE6_DEPTH, mode=Mode.SUBTRACT)

    # Fillet5
    fillet5_edges = [body_2.edges().sort_by_distance(p)[0] for p in [
        (114.640065176, 26.5, -113),
        (114.640065176, 38.5, -113),
        (114.640065176, 0, -113),
        (114.640065176, 12, -113),
        (-4.640065176, 12, -113),
        (-4.640065176, 0, -113),
        (-4.640065176, 38.5, -113),
        (-4.640065176, 26.5, -113),
        (79.4, 8.5, -113),
        (69.4, 8.5, -113),
        (30.6, 8.5, -113),
        (40.6, 8.5, -113),
    ]]
    chamfer(fillet5_edges, length=FILLET5_SIZE)

    # Fillet6
    fillet6_edges = [body_2.edges().sort_by_distance(p)[0] for p in [
        (105.671379069, 3.5, -108),
        (4.328620931, 3.5, -108),
    ]]
    chamfer(fillet6_edges, length=FILLET6_SIZE)


solid = body_2.part
